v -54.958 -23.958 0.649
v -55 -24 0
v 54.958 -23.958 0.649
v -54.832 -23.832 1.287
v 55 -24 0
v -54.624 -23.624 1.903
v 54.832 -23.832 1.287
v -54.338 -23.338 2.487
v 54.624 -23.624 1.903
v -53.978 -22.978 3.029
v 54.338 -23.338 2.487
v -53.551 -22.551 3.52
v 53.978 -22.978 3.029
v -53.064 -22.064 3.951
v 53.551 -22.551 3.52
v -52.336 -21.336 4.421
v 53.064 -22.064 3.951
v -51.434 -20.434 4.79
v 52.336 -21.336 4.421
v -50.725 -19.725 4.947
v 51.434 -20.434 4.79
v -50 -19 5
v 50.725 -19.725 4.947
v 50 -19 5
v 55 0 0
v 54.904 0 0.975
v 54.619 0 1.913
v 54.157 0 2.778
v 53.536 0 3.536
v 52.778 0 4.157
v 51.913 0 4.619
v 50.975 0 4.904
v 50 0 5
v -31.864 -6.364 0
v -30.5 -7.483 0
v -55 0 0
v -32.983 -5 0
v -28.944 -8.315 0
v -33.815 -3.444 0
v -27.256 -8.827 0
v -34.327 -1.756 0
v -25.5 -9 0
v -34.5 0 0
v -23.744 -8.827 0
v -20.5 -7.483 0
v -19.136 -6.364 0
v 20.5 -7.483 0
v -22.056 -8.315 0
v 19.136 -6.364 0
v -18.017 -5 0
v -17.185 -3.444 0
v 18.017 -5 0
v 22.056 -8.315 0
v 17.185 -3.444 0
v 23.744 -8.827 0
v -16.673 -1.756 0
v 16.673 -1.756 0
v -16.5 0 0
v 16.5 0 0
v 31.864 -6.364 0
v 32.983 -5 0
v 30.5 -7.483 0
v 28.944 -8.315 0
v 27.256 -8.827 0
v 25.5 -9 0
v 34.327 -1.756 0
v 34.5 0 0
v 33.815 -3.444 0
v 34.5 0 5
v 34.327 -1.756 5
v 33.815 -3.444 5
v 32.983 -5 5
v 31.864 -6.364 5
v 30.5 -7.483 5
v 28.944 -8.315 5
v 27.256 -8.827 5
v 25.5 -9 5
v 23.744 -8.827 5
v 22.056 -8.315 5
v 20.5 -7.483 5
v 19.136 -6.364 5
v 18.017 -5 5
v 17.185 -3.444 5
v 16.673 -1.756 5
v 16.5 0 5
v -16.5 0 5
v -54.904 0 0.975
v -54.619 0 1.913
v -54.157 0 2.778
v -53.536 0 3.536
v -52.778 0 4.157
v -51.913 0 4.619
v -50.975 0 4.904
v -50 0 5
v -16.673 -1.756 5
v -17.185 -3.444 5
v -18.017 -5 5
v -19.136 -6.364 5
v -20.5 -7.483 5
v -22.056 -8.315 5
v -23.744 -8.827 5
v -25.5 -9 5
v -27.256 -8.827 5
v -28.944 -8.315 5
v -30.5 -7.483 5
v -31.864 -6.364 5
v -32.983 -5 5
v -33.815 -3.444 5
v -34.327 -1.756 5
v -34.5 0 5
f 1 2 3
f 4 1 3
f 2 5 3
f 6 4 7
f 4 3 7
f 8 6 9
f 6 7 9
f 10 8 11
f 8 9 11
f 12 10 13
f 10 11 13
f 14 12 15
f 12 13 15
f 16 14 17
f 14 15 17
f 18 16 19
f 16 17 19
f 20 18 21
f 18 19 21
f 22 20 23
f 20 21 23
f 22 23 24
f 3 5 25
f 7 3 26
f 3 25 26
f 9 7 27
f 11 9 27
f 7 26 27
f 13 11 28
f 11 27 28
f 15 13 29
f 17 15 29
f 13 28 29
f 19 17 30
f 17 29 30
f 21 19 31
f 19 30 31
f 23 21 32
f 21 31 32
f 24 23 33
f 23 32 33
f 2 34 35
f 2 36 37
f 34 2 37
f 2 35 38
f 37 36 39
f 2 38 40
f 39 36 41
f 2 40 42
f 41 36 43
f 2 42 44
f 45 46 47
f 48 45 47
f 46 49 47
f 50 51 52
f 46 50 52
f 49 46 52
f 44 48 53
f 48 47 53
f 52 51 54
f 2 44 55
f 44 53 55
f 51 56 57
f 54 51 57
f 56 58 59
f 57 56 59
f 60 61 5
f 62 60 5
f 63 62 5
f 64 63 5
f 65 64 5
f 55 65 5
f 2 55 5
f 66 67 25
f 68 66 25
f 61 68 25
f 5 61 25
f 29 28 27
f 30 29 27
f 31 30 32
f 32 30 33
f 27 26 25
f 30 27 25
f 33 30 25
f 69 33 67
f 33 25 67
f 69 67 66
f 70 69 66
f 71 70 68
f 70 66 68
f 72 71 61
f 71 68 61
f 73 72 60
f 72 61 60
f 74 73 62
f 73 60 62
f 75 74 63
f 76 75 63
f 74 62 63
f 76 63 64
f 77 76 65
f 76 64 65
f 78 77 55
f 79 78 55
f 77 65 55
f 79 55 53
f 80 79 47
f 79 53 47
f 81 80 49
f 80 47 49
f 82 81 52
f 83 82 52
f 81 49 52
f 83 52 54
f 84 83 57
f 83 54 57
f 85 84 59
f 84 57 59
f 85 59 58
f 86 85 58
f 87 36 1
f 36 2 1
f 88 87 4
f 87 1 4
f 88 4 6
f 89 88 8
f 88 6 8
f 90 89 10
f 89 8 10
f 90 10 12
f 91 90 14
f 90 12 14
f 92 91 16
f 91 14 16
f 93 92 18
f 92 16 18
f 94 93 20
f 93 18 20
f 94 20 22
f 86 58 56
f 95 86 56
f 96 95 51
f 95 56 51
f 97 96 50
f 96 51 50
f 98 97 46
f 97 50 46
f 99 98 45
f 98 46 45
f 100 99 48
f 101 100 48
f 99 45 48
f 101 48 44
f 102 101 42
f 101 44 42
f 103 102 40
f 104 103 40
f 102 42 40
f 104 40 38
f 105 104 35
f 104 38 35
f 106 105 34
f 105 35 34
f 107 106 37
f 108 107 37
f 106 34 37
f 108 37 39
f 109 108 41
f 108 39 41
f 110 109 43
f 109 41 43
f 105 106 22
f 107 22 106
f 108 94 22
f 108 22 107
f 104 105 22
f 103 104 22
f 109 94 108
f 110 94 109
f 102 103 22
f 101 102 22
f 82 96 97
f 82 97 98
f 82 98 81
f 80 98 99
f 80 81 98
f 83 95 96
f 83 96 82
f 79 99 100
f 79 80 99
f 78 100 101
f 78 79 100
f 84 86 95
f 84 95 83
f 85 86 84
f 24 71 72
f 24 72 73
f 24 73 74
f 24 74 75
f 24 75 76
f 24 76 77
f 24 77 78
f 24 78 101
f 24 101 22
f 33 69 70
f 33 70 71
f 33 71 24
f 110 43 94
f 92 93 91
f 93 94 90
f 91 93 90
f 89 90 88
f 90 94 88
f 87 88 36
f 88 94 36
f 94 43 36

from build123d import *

# Parameters (mm, degrees)
F1_DEPTH = 5
F2_R     = 4.99999


# Not quite as in the source:
# - a fillet or chamfer is up to 0.001 mm smaller than in the source, because OpenCascade refuses the exact size


with BuildPart() as f1:
    # F0 (on Top) → F1 (new body)
    with BuildSketch(Plane.XY):
        with BuildLine():
            Line((16.5, 0), (0, 0))
            Line((0, 0), (-16.5, 0))
            ThreePointArc((-16.5, 0), (-25.5, -9), (-34.5, 0))
            Line((-34.5, 0), (-55, 0))
            Line((-55, 0), (-55, -24))
            Line((-55, -24), (0, -24))
            Line((0, -24), (55, -24))
            Line((55, -24), (55, 0))
            Line((55, 0), (34.5, 0))
            ThreePointArc((34.5, 0), (25.5, -9), (16.5, 0))
        make_face()
    extrude(amount=F1_DEPTH)

    # F2 (radius 5 in the source; OpenCascade refuses exactly that, so slightly less here)
    f2_edges = [f1.edges().sort_by_distance(p)[0] for p in [
        (0, -24, 5),
        (-55, -12, 5),
        (55, -12, 5),
    ]]
    fillet(f2_edges, radius=F2_R)


solid = f1.part
